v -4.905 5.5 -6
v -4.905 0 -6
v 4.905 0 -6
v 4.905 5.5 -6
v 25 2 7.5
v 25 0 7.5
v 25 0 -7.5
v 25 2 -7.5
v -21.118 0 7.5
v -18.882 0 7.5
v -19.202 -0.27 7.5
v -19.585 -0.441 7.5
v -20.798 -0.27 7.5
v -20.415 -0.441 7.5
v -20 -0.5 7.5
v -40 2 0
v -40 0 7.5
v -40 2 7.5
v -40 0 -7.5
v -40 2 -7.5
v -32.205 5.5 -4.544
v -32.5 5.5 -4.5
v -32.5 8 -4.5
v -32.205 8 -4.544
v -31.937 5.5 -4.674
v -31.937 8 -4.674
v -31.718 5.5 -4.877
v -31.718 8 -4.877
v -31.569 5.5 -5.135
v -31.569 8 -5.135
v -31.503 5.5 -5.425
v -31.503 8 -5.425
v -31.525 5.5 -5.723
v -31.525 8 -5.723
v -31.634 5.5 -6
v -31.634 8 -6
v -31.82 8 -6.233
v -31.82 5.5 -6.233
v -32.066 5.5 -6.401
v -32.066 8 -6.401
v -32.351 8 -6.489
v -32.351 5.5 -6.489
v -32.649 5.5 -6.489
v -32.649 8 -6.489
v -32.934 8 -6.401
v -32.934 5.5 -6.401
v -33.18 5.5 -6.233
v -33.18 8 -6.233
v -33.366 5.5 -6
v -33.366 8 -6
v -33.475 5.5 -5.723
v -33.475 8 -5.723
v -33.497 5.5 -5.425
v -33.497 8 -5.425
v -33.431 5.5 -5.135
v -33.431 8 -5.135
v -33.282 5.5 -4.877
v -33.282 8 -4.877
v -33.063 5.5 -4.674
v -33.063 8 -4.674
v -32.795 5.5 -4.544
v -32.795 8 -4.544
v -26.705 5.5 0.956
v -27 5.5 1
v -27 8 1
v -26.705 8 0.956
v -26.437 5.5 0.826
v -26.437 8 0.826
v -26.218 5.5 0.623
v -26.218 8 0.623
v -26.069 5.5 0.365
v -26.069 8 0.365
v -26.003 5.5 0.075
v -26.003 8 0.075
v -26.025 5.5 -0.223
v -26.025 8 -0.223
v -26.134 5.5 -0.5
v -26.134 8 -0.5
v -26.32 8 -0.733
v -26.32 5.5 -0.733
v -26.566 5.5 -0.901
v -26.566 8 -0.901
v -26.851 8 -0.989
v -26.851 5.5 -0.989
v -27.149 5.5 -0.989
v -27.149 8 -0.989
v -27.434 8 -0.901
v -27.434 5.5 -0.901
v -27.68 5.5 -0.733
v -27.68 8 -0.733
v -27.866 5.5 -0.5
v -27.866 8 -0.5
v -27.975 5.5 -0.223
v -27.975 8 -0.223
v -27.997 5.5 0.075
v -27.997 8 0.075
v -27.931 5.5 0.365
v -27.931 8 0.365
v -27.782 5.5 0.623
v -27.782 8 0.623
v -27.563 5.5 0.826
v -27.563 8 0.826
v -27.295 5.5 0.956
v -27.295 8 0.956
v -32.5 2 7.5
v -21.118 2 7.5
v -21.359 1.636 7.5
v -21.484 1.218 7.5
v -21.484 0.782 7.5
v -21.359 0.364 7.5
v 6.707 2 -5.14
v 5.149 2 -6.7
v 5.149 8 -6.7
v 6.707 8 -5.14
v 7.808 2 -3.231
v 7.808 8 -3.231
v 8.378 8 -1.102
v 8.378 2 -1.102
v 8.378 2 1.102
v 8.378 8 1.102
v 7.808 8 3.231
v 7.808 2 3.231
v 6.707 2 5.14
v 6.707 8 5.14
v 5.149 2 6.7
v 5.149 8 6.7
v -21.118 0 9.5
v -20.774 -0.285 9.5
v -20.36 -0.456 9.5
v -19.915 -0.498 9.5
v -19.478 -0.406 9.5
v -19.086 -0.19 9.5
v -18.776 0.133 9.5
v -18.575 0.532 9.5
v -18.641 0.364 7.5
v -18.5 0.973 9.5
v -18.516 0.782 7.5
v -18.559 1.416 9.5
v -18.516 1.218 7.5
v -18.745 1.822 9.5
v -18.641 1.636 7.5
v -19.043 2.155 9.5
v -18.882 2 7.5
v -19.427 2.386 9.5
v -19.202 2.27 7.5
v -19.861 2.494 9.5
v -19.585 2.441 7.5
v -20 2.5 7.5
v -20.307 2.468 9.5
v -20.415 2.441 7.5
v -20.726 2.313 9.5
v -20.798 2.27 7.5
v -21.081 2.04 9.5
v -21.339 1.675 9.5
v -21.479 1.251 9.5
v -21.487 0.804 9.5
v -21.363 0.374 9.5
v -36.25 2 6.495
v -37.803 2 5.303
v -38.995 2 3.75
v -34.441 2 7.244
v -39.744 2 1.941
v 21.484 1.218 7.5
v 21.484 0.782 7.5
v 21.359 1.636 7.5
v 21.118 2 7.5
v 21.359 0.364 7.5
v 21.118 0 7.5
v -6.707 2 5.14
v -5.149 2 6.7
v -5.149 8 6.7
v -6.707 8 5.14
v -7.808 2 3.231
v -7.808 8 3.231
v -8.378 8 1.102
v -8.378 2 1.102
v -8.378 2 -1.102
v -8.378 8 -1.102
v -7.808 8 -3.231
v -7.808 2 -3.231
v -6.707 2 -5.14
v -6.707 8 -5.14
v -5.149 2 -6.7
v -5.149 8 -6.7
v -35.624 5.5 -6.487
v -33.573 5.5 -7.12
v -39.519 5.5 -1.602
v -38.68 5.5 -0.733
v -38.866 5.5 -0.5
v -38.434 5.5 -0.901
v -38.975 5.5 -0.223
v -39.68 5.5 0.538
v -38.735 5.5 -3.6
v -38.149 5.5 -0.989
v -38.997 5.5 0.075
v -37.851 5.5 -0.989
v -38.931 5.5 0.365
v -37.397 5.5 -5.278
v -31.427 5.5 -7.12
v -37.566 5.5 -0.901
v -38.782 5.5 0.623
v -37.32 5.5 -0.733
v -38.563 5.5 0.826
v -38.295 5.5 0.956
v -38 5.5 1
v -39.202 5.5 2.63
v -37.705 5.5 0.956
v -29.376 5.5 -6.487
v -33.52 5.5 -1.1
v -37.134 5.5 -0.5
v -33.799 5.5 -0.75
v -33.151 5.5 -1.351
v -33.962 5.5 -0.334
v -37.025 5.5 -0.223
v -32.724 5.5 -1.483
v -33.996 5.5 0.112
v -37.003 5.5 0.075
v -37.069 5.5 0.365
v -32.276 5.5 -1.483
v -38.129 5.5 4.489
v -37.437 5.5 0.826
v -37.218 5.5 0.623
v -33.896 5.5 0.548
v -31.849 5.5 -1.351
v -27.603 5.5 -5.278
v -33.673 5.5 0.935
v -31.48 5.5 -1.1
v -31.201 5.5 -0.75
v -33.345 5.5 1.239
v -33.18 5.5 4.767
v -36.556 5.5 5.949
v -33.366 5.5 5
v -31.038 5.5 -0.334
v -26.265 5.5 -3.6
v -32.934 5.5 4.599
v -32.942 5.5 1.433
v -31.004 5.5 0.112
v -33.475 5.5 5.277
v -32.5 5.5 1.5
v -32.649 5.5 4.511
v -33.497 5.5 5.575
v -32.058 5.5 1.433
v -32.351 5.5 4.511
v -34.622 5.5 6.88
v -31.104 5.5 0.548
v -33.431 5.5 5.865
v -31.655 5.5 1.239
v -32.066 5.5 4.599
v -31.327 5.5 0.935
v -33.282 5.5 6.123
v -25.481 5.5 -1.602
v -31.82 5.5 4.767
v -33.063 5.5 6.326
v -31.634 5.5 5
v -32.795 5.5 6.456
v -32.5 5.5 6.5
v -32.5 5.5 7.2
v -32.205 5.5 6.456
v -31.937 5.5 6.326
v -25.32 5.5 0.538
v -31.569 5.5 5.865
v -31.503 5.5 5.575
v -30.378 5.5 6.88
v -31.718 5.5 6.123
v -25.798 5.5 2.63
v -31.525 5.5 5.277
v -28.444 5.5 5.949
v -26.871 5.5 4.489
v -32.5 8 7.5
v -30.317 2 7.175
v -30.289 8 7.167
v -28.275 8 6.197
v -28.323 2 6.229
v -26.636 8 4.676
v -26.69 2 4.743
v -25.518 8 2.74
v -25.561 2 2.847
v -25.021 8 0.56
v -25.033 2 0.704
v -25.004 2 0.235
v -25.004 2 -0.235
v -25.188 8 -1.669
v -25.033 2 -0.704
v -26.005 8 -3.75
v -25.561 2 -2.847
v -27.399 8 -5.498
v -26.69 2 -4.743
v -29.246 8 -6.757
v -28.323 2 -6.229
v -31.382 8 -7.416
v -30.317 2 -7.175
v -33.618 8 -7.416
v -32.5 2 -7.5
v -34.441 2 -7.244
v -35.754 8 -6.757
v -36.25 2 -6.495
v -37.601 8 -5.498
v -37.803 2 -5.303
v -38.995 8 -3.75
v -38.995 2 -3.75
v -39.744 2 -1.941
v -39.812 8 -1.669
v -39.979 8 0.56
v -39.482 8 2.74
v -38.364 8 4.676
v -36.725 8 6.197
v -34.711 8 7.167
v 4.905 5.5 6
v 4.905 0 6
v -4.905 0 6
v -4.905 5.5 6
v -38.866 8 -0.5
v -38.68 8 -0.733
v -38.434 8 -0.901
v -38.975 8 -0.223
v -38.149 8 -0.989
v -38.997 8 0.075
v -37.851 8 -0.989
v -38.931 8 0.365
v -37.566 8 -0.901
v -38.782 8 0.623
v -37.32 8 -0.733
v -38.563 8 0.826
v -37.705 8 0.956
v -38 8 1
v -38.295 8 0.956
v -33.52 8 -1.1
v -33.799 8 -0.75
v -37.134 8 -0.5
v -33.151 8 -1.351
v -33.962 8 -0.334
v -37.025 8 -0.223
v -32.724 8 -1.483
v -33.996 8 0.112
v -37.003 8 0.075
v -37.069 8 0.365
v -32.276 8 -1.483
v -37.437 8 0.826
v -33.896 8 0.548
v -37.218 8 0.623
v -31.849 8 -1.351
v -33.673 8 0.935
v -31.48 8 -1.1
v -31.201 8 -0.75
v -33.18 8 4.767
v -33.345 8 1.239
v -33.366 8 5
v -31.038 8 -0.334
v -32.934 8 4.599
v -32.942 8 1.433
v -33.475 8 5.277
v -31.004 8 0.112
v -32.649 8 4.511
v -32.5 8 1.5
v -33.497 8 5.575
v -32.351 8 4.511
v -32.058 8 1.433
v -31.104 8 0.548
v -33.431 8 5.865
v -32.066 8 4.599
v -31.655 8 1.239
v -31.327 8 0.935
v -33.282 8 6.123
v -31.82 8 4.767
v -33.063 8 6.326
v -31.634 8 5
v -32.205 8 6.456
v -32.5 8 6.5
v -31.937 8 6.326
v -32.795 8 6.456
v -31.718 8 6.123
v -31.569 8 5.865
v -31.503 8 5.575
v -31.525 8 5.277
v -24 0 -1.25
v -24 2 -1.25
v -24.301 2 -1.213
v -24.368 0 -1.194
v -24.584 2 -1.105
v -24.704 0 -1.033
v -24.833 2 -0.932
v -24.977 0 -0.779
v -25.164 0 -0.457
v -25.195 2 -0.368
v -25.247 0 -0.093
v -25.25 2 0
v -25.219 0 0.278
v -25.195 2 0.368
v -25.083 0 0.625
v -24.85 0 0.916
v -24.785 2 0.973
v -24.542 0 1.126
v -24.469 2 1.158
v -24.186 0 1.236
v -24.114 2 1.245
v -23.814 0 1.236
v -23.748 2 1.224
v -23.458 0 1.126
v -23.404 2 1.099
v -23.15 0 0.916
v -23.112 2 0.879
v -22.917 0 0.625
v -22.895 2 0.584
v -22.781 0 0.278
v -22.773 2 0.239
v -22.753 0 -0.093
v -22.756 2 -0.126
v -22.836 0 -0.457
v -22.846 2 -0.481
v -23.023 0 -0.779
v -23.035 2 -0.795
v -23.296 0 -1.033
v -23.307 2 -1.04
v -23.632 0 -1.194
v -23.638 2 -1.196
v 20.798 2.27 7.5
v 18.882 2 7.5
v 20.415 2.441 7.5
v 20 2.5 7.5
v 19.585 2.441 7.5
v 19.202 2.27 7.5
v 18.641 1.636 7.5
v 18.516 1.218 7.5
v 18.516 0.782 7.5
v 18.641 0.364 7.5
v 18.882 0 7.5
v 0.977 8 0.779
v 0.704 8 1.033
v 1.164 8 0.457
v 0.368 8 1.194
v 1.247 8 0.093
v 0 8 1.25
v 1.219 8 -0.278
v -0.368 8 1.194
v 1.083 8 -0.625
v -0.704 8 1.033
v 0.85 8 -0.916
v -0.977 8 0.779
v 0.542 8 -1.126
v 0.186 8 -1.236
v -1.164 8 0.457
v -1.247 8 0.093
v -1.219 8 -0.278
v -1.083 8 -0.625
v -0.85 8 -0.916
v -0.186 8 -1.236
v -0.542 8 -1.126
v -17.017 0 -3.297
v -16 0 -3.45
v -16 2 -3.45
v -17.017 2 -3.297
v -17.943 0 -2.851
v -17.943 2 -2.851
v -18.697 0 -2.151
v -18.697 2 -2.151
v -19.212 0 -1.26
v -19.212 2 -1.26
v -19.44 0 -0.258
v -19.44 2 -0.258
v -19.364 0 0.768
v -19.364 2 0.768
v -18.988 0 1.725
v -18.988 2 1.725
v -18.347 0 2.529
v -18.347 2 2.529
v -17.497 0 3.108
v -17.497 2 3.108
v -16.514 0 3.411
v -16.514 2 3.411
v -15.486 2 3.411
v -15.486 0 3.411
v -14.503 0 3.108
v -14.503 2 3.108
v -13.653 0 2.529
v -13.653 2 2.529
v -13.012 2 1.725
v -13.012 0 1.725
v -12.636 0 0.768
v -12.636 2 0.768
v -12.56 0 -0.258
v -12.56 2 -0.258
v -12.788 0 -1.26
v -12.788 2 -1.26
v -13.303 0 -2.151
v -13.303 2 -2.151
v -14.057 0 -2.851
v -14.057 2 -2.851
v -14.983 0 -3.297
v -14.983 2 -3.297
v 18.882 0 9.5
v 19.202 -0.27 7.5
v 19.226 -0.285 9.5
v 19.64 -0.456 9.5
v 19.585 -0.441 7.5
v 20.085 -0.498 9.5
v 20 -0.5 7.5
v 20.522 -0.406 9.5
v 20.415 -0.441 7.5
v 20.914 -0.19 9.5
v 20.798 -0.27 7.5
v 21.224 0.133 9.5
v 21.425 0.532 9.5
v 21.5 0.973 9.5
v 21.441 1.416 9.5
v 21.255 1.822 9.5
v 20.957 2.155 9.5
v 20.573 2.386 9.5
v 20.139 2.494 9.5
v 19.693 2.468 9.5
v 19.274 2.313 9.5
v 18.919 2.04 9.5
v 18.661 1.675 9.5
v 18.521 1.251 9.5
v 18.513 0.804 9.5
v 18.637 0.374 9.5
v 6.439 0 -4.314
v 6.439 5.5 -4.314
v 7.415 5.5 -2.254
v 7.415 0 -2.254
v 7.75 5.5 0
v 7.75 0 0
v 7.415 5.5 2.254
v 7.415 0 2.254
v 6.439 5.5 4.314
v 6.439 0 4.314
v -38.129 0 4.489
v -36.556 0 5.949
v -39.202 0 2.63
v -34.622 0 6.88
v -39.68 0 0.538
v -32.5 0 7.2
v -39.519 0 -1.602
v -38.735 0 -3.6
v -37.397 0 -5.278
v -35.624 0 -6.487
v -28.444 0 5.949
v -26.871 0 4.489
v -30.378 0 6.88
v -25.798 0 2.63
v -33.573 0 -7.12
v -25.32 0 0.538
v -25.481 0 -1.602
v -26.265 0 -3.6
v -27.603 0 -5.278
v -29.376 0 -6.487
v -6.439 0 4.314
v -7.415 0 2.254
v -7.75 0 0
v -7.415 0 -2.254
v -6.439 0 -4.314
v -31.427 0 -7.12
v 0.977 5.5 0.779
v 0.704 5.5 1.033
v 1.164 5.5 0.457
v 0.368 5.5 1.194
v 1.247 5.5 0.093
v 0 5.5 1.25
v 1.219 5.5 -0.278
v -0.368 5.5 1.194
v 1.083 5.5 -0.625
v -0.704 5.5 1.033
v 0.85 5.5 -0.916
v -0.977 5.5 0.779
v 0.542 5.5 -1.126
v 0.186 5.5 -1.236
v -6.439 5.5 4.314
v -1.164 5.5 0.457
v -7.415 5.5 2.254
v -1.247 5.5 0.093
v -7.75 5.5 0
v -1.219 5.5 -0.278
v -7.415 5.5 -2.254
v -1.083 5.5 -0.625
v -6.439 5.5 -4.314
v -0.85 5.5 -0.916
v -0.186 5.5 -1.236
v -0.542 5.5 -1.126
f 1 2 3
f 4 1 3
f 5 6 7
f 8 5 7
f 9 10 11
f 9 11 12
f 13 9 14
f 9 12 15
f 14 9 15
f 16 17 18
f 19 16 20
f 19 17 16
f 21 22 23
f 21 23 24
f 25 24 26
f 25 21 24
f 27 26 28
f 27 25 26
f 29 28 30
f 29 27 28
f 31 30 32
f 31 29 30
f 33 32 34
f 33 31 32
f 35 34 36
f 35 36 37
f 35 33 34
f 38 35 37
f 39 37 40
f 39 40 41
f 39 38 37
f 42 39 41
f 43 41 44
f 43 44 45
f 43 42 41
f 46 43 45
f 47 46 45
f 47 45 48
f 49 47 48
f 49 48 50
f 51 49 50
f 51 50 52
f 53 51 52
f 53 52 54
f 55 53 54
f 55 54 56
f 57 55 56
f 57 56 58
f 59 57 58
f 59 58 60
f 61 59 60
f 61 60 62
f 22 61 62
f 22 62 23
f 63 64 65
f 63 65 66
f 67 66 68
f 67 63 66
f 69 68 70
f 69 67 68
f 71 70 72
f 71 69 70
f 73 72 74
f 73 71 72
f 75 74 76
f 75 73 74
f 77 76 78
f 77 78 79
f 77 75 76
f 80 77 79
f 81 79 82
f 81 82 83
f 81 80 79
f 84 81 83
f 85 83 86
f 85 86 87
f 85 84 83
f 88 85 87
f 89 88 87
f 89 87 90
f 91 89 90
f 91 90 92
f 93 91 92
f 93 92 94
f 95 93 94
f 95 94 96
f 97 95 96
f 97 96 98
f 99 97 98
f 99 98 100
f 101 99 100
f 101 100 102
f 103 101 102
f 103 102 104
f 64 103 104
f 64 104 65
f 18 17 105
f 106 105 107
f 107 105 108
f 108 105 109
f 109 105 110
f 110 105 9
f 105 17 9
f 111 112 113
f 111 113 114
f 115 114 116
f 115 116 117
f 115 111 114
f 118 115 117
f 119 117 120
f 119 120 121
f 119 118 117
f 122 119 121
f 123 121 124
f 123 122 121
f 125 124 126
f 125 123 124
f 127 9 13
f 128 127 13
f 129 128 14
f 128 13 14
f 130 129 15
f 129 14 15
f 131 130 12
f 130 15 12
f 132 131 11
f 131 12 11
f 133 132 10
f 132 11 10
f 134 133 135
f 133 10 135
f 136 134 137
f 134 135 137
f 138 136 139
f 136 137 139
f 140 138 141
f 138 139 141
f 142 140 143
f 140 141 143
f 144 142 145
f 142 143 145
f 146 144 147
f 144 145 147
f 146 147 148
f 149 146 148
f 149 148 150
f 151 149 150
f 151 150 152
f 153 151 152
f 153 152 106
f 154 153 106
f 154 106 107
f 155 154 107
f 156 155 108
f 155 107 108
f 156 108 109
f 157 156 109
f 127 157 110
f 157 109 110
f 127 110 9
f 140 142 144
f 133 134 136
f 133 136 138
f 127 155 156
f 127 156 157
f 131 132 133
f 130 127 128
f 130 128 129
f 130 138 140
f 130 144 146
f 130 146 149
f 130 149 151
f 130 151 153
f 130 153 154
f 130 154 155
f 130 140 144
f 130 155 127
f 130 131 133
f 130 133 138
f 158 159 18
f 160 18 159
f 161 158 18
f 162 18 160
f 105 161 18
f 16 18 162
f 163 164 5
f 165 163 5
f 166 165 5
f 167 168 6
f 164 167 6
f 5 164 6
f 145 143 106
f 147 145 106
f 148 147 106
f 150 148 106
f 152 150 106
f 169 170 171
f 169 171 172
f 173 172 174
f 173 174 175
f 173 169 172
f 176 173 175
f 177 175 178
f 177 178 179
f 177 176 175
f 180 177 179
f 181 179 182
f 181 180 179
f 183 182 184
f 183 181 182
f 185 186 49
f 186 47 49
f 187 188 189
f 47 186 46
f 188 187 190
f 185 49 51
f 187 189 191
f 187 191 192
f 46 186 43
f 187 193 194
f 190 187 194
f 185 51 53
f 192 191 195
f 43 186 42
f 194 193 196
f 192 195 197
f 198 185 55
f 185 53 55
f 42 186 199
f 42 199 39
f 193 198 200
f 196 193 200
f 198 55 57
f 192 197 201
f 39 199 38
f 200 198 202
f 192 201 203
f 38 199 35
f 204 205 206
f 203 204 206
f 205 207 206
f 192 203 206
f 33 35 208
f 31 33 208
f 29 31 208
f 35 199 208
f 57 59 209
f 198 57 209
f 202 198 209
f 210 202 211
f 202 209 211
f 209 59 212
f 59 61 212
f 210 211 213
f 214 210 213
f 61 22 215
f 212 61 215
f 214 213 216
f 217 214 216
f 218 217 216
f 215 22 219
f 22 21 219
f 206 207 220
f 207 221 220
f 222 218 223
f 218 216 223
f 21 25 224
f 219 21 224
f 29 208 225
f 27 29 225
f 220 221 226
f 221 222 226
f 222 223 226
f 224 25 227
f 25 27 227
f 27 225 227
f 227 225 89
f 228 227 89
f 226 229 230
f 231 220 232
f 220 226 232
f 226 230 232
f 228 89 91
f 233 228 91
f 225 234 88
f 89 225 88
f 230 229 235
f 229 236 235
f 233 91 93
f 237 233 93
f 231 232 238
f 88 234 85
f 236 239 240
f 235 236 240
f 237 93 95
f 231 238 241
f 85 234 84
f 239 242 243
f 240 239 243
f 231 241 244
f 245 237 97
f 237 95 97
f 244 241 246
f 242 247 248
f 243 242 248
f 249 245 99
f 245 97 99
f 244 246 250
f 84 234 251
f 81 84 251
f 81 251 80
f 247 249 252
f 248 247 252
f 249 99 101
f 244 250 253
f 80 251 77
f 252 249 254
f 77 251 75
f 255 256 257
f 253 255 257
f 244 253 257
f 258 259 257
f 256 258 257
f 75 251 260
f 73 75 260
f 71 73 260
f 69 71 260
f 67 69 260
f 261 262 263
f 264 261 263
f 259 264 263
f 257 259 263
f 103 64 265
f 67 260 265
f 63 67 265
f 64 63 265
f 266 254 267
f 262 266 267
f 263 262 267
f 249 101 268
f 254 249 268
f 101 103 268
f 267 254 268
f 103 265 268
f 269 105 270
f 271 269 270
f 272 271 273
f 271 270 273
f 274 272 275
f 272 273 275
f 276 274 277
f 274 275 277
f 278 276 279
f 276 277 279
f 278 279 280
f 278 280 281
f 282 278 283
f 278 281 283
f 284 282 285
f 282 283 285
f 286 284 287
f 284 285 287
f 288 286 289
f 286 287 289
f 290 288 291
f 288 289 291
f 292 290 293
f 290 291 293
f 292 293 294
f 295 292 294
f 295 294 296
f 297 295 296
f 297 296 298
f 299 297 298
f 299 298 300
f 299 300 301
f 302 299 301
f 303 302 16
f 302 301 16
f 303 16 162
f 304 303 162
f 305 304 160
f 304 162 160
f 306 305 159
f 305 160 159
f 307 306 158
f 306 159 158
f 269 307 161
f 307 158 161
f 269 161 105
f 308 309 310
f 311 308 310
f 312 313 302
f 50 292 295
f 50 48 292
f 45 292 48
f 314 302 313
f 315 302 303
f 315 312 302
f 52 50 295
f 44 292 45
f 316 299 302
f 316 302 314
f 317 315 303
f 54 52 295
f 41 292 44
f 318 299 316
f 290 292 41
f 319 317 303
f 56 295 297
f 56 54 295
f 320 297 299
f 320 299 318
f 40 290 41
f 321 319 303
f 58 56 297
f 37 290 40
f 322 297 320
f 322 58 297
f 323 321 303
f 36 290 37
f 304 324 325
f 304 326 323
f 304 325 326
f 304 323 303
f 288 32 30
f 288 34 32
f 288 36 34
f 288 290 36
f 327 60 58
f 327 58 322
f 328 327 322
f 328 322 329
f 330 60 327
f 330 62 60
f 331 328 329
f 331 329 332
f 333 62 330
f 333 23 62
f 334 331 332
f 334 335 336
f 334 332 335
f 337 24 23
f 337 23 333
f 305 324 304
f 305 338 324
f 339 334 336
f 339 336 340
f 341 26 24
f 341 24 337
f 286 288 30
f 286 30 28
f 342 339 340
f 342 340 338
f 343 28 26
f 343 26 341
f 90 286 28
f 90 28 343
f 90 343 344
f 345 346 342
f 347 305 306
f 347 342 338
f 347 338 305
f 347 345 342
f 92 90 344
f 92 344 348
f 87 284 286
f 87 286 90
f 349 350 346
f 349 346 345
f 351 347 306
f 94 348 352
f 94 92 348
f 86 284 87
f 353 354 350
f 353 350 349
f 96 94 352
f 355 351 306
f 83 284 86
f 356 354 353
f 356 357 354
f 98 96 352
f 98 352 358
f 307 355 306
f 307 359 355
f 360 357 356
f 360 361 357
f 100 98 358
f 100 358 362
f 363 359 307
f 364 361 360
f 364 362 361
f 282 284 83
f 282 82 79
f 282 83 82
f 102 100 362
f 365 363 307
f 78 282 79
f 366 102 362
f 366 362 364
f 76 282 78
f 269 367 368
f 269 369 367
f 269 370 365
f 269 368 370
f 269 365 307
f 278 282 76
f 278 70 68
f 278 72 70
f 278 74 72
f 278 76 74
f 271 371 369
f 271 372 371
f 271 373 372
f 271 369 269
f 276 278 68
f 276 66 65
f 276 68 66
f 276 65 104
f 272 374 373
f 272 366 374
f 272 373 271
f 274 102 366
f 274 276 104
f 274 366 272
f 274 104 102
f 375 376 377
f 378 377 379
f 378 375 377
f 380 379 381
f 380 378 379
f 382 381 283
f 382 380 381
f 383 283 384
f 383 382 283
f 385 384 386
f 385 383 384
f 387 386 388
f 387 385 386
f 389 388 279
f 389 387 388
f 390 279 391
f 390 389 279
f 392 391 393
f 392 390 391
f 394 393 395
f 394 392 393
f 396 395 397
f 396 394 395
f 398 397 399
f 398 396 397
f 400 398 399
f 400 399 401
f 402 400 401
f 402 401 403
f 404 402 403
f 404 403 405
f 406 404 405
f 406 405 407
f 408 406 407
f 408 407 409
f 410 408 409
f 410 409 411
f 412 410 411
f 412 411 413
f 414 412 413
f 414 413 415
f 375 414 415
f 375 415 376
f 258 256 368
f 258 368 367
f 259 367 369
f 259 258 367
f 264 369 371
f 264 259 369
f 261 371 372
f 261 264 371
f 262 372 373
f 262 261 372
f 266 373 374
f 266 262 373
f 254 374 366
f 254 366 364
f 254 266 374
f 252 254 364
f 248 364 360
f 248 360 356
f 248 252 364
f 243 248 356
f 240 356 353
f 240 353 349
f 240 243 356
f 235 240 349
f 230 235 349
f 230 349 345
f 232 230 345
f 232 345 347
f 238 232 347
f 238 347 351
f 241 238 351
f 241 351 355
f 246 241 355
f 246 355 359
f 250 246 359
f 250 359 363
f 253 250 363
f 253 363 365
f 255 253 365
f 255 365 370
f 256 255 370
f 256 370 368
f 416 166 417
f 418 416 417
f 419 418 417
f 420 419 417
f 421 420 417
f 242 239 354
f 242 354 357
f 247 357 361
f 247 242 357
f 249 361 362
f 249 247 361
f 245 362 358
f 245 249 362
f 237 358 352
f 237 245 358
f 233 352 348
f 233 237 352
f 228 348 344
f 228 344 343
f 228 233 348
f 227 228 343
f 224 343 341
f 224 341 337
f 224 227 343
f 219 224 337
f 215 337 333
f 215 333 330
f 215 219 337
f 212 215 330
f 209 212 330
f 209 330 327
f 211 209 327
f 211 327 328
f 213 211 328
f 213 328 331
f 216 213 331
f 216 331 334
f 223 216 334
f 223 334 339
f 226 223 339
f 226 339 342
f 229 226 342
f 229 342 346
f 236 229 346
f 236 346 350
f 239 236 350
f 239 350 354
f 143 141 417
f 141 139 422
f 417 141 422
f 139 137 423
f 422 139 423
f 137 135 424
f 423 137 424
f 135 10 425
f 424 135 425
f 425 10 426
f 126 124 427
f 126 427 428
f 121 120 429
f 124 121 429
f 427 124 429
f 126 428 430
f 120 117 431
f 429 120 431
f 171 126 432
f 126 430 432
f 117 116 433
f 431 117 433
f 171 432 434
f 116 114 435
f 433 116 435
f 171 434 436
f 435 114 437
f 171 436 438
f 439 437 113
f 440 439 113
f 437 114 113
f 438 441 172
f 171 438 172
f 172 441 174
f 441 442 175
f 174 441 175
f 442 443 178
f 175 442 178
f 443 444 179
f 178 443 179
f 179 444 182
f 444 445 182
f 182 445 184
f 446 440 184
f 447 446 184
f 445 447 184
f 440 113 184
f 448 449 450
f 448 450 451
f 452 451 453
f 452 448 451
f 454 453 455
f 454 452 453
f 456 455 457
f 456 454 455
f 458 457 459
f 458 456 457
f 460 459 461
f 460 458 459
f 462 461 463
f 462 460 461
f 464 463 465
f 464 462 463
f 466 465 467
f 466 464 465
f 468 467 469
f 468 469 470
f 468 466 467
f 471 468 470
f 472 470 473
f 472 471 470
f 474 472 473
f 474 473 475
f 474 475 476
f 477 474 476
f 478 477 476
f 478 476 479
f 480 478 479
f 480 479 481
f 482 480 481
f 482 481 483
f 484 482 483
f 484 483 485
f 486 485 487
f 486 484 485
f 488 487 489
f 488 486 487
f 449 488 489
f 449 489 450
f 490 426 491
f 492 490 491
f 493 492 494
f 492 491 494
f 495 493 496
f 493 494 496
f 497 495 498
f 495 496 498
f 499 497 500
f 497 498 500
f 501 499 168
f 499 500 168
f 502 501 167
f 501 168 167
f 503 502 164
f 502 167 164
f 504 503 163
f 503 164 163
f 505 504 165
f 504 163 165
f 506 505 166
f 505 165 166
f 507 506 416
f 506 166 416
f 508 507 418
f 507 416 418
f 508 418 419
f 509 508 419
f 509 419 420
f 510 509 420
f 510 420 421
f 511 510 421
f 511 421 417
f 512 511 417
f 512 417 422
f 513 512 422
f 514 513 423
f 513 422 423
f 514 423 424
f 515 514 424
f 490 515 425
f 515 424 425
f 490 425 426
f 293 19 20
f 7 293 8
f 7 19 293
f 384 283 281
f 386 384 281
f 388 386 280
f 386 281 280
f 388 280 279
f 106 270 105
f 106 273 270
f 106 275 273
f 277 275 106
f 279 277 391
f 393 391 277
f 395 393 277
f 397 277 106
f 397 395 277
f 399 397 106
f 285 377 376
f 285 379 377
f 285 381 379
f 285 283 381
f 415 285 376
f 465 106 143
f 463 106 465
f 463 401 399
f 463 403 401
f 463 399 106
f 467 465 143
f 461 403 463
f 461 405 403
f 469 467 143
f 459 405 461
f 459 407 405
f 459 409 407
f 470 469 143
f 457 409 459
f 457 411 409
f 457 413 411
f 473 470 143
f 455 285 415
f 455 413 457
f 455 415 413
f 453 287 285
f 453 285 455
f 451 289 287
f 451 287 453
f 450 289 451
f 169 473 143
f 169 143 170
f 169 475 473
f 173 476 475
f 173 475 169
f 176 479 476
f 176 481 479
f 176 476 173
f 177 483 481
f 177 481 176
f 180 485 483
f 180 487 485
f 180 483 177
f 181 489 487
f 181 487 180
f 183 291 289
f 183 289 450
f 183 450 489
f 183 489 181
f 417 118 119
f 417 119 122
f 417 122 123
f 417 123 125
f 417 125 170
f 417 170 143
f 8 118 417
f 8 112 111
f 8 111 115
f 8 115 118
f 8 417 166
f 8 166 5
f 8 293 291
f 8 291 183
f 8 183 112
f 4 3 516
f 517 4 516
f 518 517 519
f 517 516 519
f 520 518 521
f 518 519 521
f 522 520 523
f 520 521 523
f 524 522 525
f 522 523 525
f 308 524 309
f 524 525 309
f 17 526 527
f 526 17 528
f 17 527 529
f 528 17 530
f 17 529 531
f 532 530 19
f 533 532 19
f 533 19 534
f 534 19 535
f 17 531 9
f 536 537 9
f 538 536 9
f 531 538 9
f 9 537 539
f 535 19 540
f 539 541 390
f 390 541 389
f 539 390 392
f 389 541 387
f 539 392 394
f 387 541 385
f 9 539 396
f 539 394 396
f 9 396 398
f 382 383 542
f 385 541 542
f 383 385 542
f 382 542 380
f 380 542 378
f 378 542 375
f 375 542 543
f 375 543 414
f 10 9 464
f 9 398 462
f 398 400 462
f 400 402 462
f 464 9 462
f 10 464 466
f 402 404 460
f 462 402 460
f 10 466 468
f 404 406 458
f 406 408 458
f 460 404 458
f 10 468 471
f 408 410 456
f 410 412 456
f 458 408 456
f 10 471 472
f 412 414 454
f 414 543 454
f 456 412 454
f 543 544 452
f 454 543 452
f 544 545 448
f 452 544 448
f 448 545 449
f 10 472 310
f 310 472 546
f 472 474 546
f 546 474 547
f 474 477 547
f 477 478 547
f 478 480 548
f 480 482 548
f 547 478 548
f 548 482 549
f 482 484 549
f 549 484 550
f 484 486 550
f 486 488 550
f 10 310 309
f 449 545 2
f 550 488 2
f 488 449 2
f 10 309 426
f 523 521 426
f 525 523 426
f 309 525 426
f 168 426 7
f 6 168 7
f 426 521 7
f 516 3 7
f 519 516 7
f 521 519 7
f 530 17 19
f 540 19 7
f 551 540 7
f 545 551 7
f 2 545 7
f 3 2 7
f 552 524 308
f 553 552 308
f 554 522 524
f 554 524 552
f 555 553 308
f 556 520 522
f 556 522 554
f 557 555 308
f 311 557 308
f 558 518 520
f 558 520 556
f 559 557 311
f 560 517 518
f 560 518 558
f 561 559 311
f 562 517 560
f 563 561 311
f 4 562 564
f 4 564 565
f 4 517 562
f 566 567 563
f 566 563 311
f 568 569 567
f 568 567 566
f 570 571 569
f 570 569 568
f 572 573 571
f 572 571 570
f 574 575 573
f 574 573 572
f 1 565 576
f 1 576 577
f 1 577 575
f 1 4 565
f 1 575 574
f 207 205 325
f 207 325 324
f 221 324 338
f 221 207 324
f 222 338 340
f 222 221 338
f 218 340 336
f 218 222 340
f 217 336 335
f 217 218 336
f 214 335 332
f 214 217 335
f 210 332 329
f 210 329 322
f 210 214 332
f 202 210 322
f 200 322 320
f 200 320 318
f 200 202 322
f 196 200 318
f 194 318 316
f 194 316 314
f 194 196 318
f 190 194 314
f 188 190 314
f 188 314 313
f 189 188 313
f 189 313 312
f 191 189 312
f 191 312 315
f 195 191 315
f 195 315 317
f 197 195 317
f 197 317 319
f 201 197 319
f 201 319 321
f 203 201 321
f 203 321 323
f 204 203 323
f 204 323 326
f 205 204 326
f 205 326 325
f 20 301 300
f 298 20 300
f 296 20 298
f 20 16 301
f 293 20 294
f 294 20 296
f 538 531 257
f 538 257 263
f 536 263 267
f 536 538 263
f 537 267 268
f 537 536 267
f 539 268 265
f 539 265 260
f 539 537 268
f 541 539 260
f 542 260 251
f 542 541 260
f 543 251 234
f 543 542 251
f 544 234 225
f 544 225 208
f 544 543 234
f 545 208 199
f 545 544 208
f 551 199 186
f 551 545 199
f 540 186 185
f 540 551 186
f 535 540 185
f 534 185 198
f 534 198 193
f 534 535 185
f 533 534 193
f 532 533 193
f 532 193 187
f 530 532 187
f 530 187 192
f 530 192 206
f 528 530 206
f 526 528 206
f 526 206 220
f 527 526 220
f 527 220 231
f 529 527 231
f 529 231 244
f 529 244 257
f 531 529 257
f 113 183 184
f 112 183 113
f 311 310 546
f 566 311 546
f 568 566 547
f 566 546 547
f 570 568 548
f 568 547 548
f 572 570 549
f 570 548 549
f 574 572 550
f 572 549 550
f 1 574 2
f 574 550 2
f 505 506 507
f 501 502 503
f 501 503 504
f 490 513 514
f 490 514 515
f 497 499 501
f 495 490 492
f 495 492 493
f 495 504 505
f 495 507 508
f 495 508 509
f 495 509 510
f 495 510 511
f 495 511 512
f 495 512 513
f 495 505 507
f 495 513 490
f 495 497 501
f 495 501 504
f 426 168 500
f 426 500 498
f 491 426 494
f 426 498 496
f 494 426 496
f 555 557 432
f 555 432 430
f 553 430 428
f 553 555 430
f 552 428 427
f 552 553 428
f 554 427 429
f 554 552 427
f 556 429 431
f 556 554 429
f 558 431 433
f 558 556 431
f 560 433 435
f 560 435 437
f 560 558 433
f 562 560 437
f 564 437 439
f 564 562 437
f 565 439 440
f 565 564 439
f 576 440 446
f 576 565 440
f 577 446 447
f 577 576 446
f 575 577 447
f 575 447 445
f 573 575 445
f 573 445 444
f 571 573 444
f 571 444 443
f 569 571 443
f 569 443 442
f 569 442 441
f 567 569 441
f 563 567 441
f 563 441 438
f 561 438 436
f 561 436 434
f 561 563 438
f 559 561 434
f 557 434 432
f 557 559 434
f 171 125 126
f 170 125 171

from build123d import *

# Parameters (mm, degrees)
SKETCH_1_W               = 65
SKETCH_1_H               = 15
EXTRUDE_1_DEPTH          = 2
SKETCH_2_R               = 1.25
SKETCH_2_R_2             = 3.45
SKETCH_2_R_3             = 1.5
SKETCH_2_R_4             = 1
CUT_EXTRUDE_1_DEPTH      = 2
SKETCH_4_R               = 1.5
EXTRUDE_2_DEPTH          = 2
SKETCH_5_R               = 7.5
SKETCH_5_R_2             = 7.2
EXTRUDE_3_DEPTH          = 6
SKETCH_5_8_R             = 1.25
SKETCH_5_8_R_2           = 7.2
EXTRUDE_4_DEPTH          = 6
CUT_EXTRUDE_2_DEPTH      = 3.5
CUT_EXTRUDE_2_DEPTH_BACK = 42.548164821
SKETCH_5_11_R            = 1.25
SKETCH_5_11_R_2          = 7.2
SKETCH_2_3_R             = 1.5
SKETCH_2_3_R_2           = 1
CUT_EXTRUDE_3_DEPTH      = 8


with BuildPart() as part:
    # 草图1 → 凸台-拉伸1 (new body)
    with BuildSketch(Plane(origin=(0, 0, 0), x_dir=(1, 0, 0), z_dir=(0, 1, 0))):
        with Locations((-7.5, 0)):
            Rectangle(SKETCH_1_W, SKETCH_1_H)
    extrude(amount=EXTRUDE_1_DEPTH)

    # 草图2 → 切除-拉伸1 (cut)
    with BuildSketch(Plane(origin=(0, 0, 0), x_dir=(1, 0, 0), z_dir=(0, 1, 0))):
        with Locations(Location((0, 0, 0), (0, 0, 270))):
            Circle(SKETCH_2_R)
        with Locations(Location((-16, 0, 0), (0, 0, 90))):
            Circle(SKETCH_2_R_2)
        with Locations(Location((-24, 0, 0), (0, 0, 90))):
            Circle(SKETCH_2_R)
        with Locations(Location((-32.5, 0, 0), (0, 0, 270))):
            Circle(SKETCH_2_R_3)
        with Locations(Location((-27, 0, 0), (0, 0, 270))):
            Circle(SKETCH_2_R_4)
        with Locations(Location((-32.5, -5.5, 0), (0, 0, 270))):
            Circle(SKETCH_2_R_4)
        with Locations(Location((-38, 0, 0), (0, 0, 270))):
            Circle(SKETCH_2_R_4)
        with Locations(Location((-32.5, 5.5, 0), (0, 0, 270))):
            Circle(SKETCH_2_R_4)
    extrude(amount=CUT_EXTRUDE_1_DEPTH, mode=Mode.SUBTRACT)

    # 草图4 → 凸台-拉伸2 (add)
    with BuildSketch(Plane.XY.offset(7.5)):
        with Locations(Location((20, 1, 0), (0, 0, 221.810314896))):
            Circle(SKETCH_4_R)
        with Locations(Location((-20, 1, 0), (0, 0, 221.810314896))):
            Circle(SKETCH_4_R)
    extrude(amount=EXTRUDE_2_DEPTH)

    # 草图5 → 凸台-拉伸3 (add)
    # profile 1 of 2: a face of its own
    with BuildSketch(Plane(origin=(0, 2, 0), x_dir=(1, 0, 0), z_dir=(0, 1, 0))):
        with Locations(Location((-32.5, 0, 0), (0, 0, 270))):
            Circle(SKETCH_5_R)
        with Locations(Location((-32.5, 0, 0), (0, 0, 270))):
            Circle(SKETCH_5_R_2, mode=Mode.SUBTRACT)
    # profile 2 of 2: a face of its own
    with BuildSketch(Plane(origin=(0, 2, 0), x_dir=(1, 0, 0), z_dir=(0, 1, 0))):
        with BuildLine():
            Line((5.149029035, -6.7), (-5.149029035, -6.7))
            ThreePointArc((-5.149029035, -6.7), (-8.45, 0), (-5.149029035, 6.7))
            Line((-5.149029035, 6.7), (5.149029035, 6.7))
            ThreePointArc((5.149029035, 6.7), (8.45, 0), (5.149029035, -6.7))
        make_face()
        with BuildLine():
            Line((4.905354218, -6), (-4.905354218, -6))
            ThreePointArc((-4.905354218, -6), (-7.75, 0), (-4.905354218, 6))
            Line((-4.905354218, 6), (4.905354218, 6))
            ThreePointArc((4.905354218, 6), (7.75, 0), (4.905354218, -6))
        make_face(mode=Mode.SUBTRACT)
    extrude(amount=EXTRUDE_3_DEPTH)

    # 草图5<8> → 凸台-拉伸4 (add)
    # profile 1 of 2: a face of its own
    with BuildSketch(Plane(origin=(0, 2, 0), x_dir=(1, 0, 0), z_dir=(0, 1, 0))):
        with BuildLine():
            Line((4.905354218, -6), (-4.905354218, -6))
            ThreePointArc((-4.905354218, -6), (-7.75, 0), (-4.905354218, 6))
            Line((-4.905354218, 6), (4.905354218, 6))
            ThreePointArc((4.905354218, 6), (7.75, 0), (4.905354218, -6))
        make_face()
        with Locations(Location((0, 0, 0), (0, 0, 270))):
            Circle(SKETCH_5_8_R, mode=Mode.SUBTRACT)
    # profile 2 of 2: a face of its own
    with BuildSketch(Plane(origin=(0, 2, 0), x_dir=(1, 0, 0), z_dir=(0, 1, 0))):
        with Locations((-32.5, 0)):
            Circle(SKETCH_5_8_R_2)
    extrude(amount=EXTRUDE_4_DEPTH)

    # 草图5<11> → 切除-拉伸2 (cut, two sides: drawn at the far end of the back side and taken through both)
    # profile 1 of 2: a face of its own
    with BuildSketch(Plane(origin=(0, 2, 0), x_dir=(1, 0, 0), z_dir=(0, 1, 0)).offset(-CUT_EXTRUDE_2_DEPTH_BACK)):
        with BuildLine():
            Line((4.905354218, -6), (-4.905354218, -6))
            ThreePointArc((-4.905354218, -6), (-7.75, 0), (-4.905354218, 6))
            Line((-4.905354218, 6), (4.905354218, 6))
            ThreePointArc((4.905354218, 6), (7.75, 0), (4.905354218, -6))
        make_face()
        with Locations(Location((0, 0, 0), (0, 0, 270))):
            Circle(SKETCH_5_11_R, mode=Mode.SUBTRACT)
    # profile 2 of 2: a face of its own
    with BuildSketch(Plane(origin=(0, 2, 0), x_dir=(1, 0, 0), z_dir=(0, 1, 0)).offset(-CUT_EXTRUDE_2_DEPTH_BACK)):
        with Locations(Location((-32.5, 0, 0), (0, 0, 270))):
            Circle(SKETCH_5_11_R_2)
    extrude(amount=CUT_EXTRUDE_2_DEPTH + CUT_EXTRUDE_2_DEPTH_BACK, mode=Mode.SUBTRACT)

    # 草图2<3> → 切除-拉伸3 (cut)
    with BuildSketch(Plane(origin=(0, 0, 0), x_dir=(1, 0, 0), z_dir=(0, 1, 0))):
        with Locations(Location((-32.5, 0, 0), (0, 0, 270))):
            Circle(SKETCH_2_3_R)
        with Locations(Location((-32.5, 5.5, 0), (0, 0, 270))):
            Circle(SKETCH_2_3_R_2)
        with Locations(Location((-38, 0, 0), (0, 0, 270))):
            Circle(SKETCH_2_3_R_2)
        with Locations(Location((-32.5, -5.5, 0), (0, 0, 270))):
            Circle(SKETCH_2_3_R_2)
        with Locations(Location((-27, 0, 0), (0, 0, 270))):
            Circle(SKETCH_2_3_R_2)
    extrude(amount=CUT_EXTRUDE_3_DEPTH, mode=Mode.SUBTRACT)


solid = part.part
